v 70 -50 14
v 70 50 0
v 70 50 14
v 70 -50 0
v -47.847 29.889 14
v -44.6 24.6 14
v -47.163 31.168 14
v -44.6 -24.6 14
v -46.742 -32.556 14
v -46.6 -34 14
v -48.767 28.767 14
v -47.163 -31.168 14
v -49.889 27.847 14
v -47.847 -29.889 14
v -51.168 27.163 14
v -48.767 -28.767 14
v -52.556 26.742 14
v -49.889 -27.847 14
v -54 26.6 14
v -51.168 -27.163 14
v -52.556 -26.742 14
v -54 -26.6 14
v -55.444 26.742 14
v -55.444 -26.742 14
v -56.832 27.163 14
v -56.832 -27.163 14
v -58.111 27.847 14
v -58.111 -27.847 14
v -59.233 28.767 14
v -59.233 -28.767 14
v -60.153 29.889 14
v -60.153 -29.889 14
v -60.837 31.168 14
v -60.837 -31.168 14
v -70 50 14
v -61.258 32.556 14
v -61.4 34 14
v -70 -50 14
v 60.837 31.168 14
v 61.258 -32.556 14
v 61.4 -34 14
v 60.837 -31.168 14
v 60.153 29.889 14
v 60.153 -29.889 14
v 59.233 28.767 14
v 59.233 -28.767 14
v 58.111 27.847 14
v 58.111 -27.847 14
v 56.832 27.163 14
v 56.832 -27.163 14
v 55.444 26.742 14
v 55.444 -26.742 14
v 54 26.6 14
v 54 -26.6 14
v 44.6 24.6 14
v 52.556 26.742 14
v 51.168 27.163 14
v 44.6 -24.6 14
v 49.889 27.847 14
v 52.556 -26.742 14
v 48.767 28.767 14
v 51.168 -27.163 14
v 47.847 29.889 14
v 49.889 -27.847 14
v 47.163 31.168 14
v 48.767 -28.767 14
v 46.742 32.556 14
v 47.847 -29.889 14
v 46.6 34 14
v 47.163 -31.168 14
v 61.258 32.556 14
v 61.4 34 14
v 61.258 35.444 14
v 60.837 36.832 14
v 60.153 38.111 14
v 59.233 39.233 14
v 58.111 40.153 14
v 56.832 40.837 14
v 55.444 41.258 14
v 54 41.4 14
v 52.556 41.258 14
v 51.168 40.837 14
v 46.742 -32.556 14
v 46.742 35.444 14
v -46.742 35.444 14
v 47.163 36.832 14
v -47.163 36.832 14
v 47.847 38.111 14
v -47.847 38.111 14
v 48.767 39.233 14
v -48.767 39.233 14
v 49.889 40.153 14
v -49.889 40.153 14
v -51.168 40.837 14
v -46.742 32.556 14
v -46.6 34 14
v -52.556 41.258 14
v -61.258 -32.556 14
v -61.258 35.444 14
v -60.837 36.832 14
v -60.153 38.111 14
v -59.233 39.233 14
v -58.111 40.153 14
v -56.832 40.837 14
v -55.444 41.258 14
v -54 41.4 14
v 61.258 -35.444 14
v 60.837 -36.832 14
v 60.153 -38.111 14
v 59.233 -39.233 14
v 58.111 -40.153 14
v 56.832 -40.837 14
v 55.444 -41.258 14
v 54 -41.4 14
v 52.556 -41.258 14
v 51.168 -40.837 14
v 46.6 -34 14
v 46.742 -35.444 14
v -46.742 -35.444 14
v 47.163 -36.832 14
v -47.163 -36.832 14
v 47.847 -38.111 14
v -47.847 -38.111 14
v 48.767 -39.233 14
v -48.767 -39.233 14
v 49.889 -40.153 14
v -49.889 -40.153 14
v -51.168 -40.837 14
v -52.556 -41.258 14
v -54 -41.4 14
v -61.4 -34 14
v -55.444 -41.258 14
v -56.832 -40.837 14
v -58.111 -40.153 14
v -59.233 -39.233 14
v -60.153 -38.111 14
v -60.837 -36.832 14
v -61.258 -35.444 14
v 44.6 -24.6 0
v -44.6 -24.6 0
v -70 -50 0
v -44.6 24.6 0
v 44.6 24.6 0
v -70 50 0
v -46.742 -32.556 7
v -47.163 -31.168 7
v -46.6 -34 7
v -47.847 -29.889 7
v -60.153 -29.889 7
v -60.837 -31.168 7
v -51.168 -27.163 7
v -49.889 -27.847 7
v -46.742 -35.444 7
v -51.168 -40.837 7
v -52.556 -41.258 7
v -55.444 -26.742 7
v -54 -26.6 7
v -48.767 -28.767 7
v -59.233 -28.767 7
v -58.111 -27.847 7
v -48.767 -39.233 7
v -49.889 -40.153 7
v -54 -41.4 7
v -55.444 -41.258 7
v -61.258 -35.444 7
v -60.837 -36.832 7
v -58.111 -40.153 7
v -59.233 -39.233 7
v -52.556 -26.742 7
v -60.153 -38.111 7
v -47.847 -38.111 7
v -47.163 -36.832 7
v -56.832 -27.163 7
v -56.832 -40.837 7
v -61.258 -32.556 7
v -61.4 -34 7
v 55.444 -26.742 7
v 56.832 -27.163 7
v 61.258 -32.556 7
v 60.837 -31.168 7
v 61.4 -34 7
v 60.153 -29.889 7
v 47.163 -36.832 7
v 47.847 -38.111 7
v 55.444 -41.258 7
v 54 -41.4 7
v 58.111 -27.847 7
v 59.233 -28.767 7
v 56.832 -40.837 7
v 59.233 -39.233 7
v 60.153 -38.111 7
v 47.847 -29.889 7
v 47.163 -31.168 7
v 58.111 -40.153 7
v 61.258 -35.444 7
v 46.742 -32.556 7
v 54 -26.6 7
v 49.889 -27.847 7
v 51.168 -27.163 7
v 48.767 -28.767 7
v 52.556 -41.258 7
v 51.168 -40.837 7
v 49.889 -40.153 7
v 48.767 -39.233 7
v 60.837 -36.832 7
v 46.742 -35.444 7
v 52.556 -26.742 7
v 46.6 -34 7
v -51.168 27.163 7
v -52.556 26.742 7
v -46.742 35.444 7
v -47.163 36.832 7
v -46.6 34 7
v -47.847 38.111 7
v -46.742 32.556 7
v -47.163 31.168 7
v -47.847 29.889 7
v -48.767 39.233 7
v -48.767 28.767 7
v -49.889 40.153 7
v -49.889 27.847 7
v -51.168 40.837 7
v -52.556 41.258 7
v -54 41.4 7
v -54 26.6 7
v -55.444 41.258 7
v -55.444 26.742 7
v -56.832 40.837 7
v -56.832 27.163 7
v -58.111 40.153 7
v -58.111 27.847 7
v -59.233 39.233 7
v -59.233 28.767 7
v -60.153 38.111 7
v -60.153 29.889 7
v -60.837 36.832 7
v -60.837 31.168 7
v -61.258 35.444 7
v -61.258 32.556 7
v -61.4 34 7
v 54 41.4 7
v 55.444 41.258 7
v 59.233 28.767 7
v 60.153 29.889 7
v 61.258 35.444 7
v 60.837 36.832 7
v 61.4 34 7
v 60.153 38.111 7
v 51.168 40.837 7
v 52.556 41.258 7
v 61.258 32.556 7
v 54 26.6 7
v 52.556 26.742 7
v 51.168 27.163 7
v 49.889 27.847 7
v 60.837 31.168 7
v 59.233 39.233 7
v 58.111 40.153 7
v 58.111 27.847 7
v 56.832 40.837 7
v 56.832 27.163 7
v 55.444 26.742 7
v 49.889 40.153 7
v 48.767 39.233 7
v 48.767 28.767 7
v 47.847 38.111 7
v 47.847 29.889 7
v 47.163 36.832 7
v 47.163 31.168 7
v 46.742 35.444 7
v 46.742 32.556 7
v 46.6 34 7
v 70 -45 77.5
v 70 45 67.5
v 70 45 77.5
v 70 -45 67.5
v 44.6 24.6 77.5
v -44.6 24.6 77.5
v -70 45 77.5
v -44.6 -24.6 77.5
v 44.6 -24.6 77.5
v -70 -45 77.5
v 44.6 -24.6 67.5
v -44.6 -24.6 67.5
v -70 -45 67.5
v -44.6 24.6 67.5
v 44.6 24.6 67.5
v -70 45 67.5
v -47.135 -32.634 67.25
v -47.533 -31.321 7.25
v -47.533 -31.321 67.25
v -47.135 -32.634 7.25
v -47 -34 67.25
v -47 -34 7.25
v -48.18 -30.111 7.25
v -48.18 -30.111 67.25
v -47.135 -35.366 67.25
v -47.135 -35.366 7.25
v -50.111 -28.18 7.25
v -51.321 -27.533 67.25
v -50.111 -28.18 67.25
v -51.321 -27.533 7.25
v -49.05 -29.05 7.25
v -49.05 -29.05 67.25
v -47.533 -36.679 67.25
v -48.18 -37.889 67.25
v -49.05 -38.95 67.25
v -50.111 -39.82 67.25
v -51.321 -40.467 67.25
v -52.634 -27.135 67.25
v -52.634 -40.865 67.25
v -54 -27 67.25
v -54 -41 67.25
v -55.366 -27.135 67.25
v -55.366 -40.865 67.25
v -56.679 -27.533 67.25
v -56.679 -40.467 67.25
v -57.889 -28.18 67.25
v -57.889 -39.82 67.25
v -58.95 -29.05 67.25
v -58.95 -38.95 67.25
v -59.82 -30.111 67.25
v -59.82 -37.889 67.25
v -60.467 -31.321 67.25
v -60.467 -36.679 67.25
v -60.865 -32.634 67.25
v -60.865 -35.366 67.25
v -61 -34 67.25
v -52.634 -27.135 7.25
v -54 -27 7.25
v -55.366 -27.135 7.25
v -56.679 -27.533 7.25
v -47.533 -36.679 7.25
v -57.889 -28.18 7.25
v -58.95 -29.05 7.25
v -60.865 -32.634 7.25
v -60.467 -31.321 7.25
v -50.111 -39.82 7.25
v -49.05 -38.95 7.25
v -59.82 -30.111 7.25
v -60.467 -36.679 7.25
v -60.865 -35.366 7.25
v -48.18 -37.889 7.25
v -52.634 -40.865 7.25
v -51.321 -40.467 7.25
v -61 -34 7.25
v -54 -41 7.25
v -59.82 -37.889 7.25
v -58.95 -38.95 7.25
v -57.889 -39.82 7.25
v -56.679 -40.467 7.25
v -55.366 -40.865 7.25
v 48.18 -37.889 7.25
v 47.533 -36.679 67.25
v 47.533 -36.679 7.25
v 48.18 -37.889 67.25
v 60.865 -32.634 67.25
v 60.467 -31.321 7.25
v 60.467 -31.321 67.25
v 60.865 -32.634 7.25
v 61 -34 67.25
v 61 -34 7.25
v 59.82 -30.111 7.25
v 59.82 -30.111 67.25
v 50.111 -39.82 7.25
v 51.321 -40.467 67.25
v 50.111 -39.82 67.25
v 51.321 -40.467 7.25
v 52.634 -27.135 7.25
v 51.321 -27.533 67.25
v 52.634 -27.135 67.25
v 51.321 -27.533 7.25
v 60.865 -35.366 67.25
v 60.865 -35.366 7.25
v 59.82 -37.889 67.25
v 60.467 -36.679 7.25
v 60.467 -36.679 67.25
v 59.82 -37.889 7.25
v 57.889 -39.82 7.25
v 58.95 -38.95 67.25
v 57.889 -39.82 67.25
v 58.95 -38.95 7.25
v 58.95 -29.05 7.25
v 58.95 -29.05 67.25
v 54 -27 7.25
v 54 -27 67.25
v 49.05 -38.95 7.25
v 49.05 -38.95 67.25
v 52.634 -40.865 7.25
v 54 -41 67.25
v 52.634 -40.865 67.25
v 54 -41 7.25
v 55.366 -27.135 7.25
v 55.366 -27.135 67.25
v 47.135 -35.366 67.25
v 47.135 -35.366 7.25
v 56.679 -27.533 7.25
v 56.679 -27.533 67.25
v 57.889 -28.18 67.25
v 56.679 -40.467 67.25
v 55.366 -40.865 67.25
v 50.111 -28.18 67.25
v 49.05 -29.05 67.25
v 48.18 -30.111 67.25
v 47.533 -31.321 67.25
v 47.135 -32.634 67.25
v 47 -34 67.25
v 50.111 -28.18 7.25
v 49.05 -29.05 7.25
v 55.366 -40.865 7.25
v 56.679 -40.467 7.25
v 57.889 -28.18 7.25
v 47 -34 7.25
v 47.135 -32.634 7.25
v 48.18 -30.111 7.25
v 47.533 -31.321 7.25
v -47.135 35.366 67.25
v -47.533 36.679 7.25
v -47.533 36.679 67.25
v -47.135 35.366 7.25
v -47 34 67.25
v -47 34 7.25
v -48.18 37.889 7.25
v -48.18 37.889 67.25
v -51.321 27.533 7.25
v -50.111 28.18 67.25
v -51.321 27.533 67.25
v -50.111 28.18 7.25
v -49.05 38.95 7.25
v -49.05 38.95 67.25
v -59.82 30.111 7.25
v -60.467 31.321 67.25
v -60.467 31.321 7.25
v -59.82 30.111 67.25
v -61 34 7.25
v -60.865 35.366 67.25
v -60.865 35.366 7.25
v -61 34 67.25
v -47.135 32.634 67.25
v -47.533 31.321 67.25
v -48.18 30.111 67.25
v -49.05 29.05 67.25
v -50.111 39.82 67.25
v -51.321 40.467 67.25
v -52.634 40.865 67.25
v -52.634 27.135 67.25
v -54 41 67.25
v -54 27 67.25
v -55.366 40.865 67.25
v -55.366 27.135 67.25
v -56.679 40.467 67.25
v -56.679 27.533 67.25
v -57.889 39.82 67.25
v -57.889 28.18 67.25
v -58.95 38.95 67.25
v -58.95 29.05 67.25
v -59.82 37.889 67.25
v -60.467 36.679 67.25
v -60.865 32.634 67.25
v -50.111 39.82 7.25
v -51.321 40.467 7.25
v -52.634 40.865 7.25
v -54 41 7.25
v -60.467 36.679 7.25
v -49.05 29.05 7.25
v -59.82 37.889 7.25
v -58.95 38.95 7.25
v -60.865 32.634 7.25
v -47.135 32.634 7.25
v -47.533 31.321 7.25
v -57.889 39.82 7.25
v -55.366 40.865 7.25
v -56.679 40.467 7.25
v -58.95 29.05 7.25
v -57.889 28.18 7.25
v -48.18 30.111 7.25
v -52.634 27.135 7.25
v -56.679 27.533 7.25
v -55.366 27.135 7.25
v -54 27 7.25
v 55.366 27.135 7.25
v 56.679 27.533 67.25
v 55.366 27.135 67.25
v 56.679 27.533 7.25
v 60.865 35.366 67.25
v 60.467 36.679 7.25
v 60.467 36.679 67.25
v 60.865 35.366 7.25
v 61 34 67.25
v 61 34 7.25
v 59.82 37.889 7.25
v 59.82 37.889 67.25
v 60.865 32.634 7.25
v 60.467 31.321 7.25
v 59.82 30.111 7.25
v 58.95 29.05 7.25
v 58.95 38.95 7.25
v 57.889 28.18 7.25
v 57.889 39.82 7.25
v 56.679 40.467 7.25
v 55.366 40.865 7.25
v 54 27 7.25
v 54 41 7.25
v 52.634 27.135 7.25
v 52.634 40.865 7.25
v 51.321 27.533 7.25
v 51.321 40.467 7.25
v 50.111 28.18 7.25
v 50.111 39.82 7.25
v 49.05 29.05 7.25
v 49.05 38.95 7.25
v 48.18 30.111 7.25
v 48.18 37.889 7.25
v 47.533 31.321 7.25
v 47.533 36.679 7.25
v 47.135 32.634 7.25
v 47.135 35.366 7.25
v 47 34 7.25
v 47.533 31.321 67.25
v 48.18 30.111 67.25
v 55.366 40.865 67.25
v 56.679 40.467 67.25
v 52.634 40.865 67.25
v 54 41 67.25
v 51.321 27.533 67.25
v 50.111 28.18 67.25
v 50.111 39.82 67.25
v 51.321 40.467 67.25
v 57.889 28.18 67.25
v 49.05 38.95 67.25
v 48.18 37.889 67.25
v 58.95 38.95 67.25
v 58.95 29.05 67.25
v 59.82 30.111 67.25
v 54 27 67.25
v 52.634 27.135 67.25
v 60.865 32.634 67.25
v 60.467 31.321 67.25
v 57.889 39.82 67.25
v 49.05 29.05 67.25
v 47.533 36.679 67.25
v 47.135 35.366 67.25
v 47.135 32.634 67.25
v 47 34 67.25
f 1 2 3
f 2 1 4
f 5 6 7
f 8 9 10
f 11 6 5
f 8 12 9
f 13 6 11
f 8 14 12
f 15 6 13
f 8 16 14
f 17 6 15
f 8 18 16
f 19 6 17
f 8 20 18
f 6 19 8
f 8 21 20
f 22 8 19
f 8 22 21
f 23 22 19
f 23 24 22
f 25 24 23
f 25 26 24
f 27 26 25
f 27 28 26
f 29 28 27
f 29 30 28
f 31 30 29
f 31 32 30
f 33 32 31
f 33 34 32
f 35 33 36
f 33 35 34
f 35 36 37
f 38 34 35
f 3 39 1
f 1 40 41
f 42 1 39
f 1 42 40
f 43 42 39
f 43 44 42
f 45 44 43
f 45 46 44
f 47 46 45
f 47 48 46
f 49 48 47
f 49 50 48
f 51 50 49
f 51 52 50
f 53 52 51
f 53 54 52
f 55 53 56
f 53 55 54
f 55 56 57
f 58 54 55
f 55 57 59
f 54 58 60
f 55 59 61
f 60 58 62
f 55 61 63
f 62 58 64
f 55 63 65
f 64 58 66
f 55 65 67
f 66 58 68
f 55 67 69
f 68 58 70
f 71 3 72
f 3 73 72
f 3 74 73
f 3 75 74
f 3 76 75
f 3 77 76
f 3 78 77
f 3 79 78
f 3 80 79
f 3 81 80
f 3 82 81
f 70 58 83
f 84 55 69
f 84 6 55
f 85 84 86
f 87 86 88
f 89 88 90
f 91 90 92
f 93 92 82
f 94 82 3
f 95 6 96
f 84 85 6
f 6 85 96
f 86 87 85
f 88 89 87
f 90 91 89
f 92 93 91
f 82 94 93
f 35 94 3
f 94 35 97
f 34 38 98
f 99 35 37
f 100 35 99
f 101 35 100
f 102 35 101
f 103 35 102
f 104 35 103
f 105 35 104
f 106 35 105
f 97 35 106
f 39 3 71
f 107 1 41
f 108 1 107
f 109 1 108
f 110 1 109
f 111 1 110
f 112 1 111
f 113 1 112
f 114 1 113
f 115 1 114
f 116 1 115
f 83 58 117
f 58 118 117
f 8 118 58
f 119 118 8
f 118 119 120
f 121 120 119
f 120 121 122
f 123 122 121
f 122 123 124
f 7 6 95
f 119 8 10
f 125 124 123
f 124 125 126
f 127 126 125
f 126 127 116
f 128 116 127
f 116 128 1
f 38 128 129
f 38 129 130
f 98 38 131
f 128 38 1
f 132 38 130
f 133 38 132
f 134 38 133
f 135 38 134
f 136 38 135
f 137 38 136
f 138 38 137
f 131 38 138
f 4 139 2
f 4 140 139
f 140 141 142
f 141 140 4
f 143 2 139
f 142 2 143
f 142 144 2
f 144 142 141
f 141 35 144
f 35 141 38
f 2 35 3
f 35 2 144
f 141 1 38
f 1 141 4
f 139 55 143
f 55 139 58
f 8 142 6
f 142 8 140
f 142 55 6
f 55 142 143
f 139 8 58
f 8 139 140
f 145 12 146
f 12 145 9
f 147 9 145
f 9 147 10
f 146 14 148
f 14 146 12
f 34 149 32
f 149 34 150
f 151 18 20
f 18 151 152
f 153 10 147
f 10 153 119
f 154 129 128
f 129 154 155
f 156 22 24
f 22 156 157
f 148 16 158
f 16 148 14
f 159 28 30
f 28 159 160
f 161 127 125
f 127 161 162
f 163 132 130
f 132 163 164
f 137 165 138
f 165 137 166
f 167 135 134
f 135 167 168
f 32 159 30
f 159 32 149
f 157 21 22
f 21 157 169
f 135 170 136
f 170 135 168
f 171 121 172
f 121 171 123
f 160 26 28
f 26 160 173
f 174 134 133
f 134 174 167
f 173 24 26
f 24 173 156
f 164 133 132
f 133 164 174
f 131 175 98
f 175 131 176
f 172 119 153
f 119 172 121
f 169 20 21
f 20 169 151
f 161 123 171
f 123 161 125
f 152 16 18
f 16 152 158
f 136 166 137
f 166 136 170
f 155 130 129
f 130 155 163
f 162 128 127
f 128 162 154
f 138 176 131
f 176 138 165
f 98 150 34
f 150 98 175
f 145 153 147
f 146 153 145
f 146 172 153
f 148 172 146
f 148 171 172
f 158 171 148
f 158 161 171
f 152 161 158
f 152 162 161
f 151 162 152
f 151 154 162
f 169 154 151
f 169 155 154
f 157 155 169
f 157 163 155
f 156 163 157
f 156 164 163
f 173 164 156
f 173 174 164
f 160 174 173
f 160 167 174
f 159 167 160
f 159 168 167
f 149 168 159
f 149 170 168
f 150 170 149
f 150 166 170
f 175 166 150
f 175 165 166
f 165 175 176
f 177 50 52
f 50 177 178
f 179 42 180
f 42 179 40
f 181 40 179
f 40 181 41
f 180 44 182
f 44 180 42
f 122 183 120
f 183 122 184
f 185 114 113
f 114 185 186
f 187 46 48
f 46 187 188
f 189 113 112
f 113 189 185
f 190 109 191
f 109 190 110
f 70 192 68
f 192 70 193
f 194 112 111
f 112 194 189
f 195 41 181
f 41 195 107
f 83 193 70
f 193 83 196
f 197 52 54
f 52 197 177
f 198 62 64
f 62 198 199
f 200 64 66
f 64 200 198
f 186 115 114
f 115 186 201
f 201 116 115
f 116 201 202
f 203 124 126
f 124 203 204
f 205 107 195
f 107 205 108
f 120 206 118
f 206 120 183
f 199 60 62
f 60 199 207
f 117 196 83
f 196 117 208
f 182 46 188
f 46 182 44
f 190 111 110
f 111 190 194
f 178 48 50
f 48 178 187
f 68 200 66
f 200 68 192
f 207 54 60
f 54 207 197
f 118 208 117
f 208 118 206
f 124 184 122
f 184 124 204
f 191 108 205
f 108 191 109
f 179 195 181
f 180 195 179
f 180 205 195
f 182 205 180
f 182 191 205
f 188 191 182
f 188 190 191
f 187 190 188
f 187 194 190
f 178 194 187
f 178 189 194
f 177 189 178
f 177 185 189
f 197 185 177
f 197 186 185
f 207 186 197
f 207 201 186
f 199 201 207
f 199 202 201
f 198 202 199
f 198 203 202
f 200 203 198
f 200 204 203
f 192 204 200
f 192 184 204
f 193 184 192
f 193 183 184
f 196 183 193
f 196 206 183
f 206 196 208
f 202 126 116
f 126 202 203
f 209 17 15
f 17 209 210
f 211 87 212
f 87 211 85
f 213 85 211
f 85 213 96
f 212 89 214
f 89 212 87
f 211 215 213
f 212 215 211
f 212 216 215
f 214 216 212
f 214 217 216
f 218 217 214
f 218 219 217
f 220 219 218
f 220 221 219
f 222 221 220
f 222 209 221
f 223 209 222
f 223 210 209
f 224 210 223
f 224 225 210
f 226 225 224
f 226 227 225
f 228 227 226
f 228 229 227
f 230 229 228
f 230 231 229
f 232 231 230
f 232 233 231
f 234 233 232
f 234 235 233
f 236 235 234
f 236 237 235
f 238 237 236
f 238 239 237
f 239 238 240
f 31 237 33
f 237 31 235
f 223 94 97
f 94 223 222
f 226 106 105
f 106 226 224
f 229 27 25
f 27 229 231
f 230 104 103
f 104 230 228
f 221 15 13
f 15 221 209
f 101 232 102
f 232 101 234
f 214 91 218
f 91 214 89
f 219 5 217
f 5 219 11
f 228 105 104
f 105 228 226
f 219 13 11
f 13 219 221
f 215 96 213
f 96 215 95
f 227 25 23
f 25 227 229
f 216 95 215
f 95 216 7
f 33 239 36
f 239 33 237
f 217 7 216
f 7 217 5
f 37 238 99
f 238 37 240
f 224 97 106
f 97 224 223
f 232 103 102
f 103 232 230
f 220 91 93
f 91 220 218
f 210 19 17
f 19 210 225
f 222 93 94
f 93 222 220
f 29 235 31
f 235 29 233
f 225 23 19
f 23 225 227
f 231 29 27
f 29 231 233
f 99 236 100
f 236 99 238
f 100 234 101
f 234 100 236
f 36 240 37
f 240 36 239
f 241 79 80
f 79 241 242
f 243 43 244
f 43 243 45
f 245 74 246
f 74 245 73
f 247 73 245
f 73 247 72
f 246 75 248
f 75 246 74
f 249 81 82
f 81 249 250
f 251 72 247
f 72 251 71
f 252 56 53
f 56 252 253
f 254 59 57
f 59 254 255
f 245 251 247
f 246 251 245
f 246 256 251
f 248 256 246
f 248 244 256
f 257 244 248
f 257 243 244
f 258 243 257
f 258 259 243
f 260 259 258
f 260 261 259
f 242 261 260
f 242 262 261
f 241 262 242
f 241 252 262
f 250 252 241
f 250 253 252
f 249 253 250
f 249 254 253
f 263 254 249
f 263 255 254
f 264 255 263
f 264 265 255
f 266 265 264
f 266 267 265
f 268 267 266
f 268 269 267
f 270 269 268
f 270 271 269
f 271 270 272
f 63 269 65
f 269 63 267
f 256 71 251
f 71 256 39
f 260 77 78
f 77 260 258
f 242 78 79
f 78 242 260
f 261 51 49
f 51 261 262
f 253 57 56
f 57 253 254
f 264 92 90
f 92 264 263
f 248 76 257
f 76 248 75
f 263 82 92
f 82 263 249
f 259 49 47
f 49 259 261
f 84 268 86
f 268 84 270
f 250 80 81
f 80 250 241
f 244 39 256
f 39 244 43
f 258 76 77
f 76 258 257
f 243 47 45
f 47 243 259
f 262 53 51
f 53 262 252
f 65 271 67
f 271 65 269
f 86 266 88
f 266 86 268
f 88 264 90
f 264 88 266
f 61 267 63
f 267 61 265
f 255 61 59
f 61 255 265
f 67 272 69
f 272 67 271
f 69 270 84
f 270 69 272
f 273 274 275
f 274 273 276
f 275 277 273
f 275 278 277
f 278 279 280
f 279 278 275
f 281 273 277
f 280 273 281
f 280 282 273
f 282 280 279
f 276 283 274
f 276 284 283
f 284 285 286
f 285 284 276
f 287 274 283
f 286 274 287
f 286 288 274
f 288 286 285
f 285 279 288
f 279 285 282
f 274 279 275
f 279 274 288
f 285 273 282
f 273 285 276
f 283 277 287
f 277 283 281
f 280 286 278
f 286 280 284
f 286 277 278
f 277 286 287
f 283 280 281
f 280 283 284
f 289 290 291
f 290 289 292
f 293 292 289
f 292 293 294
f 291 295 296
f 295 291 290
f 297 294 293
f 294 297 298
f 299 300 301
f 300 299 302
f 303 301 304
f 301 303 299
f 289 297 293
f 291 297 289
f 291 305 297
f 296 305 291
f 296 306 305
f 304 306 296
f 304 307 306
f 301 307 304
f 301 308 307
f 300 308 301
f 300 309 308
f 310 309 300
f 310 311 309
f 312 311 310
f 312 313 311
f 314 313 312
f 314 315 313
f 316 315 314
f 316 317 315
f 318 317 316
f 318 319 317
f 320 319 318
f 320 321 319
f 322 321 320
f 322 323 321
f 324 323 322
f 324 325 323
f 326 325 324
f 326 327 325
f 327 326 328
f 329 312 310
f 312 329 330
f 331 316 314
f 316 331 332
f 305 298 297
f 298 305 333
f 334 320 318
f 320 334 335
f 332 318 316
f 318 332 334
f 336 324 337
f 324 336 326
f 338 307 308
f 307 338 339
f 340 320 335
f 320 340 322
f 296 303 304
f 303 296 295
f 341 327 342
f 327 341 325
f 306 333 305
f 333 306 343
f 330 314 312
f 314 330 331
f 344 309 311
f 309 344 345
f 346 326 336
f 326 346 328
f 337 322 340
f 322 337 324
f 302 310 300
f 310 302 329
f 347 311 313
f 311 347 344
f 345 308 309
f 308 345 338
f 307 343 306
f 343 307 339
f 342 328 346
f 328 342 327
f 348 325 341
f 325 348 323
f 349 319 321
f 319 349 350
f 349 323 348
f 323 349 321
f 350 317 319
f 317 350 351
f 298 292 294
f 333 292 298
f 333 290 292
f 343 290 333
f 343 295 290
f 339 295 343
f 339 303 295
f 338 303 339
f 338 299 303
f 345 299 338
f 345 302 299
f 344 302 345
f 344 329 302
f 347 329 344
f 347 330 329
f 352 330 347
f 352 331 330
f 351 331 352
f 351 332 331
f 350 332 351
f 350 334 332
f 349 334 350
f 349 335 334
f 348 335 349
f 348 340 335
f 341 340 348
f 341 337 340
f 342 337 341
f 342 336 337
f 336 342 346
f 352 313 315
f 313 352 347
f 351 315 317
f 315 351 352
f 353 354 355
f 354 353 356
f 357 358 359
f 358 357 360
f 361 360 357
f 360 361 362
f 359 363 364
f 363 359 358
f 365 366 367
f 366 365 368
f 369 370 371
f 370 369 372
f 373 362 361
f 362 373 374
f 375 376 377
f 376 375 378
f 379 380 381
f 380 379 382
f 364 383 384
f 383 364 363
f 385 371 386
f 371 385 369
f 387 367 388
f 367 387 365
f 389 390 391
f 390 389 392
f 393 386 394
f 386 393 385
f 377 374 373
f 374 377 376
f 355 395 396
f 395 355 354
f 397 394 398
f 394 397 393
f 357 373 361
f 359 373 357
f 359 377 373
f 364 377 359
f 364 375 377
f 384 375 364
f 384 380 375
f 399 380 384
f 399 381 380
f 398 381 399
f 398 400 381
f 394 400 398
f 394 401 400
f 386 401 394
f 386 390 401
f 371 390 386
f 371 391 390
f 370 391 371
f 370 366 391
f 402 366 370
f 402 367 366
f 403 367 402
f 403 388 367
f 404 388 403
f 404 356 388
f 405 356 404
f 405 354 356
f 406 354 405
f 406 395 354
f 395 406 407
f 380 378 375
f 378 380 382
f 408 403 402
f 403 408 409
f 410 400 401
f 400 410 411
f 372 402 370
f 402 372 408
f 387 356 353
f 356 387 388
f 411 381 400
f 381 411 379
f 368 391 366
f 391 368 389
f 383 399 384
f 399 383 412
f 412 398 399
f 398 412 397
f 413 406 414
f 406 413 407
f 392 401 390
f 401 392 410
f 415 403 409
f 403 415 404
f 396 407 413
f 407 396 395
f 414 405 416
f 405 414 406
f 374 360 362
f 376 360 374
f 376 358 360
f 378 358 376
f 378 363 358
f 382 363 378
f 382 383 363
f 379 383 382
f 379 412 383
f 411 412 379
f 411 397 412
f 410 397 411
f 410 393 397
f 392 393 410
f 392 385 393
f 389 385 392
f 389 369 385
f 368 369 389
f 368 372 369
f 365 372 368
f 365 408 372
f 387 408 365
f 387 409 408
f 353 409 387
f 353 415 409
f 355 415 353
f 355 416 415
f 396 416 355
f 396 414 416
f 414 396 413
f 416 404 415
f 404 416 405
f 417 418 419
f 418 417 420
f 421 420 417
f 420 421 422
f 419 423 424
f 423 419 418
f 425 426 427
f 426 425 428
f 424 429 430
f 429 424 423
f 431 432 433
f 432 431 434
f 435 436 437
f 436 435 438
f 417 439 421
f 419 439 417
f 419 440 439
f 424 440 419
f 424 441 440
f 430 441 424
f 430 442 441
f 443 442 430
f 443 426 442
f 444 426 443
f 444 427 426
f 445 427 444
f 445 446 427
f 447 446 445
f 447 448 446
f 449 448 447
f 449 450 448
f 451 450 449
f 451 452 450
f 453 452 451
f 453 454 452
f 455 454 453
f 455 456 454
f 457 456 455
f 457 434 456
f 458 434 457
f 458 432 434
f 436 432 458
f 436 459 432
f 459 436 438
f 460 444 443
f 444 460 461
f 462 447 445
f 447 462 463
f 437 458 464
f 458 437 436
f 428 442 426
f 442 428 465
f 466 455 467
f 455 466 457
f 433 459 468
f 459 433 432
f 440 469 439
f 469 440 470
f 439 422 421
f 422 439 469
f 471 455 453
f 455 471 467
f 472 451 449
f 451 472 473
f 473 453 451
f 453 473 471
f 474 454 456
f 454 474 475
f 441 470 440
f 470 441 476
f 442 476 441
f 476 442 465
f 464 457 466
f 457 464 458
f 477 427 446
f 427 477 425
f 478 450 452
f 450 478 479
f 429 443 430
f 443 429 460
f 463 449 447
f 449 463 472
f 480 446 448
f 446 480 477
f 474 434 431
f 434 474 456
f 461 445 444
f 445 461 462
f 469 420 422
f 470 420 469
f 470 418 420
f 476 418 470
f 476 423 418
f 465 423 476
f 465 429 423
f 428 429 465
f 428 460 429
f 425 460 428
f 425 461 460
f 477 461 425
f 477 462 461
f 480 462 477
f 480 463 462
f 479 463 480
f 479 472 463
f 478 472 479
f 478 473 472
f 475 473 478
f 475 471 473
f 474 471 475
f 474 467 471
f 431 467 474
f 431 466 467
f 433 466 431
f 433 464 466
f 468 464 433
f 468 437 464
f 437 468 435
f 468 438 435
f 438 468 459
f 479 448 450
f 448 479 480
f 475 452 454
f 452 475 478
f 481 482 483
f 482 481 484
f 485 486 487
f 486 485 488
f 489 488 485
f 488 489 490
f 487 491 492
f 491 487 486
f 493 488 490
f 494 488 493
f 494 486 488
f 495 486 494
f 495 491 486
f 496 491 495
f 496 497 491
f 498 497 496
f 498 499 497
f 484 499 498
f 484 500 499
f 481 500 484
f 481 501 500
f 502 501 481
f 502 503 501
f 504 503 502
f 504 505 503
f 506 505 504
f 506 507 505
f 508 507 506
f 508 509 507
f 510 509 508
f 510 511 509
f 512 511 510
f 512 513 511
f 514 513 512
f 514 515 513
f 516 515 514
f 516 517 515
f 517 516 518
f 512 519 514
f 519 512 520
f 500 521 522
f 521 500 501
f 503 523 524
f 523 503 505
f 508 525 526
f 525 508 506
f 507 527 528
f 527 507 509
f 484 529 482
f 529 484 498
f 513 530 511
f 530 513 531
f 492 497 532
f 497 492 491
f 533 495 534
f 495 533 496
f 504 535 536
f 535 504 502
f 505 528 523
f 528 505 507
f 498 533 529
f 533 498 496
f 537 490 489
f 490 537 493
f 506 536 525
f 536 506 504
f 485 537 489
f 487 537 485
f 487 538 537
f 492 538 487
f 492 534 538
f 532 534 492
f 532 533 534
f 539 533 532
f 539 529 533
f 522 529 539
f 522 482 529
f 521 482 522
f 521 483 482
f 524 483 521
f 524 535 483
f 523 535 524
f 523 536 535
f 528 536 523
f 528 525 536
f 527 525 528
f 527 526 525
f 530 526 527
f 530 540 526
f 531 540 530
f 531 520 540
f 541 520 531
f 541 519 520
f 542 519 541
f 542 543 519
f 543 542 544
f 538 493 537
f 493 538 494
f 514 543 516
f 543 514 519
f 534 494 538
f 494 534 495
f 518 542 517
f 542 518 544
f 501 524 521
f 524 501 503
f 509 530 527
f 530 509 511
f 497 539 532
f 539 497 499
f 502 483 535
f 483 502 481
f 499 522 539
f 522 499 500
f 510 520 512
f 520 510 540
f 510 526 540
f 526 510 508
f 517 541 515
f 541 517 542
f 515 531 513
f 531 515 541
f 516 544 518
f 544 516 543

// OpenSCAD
$fn = 32;

// ------------------------------------------------------------------------
// Frame cube: base 140 x 100 mm, posts 60 mm tall
// Every part is its own module, assembly() places every instance.
// ------------------------------------------------------------------------

// --- part 1 ---
module base_frame() {
  difference() {
    translate([-70, -50, 0]) cube([140, 100, 14]);
    translate([-44.6, -24.6, -1]) cube([89.2, 49.2, 16]);
    translate([-54, -34, 7]) cylinder(h = 8, d = 14.8);
    translate([54, -34, 7]) cylinder(h = 8, d = 14.8);
    translate([-54, 34, 7]) cylinder(h = 8, d = 14.8);
    translate([54, 34, 7]) cylinder(h = 8, d = 14.8);
  }
}

// --- part 2 ---
module corner_post() {
  cylinder(h = 60, d = 14);
}

// --- part 3 ---
module top_frame() {
  difference() {
    translate([-70, -45, 0]) cube([140, 90, 10]);
    translate([-44.6, -24.6, -1]) cube([89.2, 49.2, 12]);
  }
}

// --- assembly ---
module assembly() {
  color([0.80, 0.24, 0.20]) translate([0, 0, 0]) rotate([0, 0, 0]) base_frame();
  color([0.20, 0.45, 0.75]) translate([-54, -34, 7.25]) rotate([0, 0, 0]) corner_post();
  color([0.25, 0.62, 0.32]) translate([54, -34, 7.25]) rotate([0, 0, 0]) corner_post();
  color([0.92, 0.70, 0.18]) translate([-54, 34, 7.25]) rotate([0, 0, 0]) corner_post();
  color([0.58, 0.35, 0.70]) translate([54, 34, 7.25]) rotate([0, 0, 0]) corner_post();
  color([0.16, 0.66, 0.66]) translate([0, 0, 67.5]) rotate([0, 0, 0]) top_frame();
}

assembly();
